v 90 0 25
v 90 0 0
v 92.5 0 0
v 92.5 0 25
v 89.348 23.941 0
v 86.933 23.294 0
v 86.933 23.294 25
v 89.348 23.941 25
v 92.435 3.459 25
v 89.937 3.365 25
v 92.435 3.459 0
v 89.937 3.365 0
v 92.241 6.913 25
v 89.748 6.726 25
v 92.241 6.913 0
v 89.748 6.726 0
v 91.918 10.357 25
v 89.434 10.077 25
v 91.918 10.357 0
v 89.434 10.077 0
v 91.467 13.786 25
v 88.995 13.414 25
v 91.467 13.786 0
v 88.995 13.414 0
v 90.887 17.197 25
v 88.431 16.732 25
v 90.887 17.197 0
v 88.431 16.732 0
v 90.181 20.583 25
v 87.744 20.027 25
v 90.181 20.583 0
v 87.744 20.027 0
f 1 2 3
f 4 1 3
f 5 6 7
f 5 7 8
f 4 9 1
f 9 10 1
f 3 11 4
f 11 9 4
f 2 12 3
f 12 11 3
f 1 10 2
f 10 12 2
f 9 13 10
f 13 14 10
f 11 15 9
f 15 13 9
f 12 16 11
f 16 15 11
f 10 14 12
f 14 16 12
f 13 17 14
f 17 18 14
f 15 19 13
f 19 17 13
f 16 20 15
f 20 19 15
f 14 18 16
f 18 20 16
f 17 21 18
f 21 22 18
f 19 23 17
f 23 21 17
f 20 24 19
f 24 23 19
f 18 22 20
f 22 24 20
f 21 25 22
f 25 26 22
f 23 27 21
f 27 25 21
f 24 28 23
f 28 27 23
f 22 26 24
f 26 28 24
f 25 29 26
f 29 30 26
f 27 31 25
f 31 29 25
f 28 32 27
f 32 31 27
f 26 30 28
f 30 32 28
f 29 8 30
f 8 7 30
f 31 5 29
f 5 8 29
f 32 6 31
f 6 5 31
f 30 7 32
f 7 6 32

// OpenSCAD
rotate_extrude($fn = 180, angle = 15) {
	translate(v = [90, 0, 0]) {
		square(size = [2.5000000000, 25]);
	}
}
